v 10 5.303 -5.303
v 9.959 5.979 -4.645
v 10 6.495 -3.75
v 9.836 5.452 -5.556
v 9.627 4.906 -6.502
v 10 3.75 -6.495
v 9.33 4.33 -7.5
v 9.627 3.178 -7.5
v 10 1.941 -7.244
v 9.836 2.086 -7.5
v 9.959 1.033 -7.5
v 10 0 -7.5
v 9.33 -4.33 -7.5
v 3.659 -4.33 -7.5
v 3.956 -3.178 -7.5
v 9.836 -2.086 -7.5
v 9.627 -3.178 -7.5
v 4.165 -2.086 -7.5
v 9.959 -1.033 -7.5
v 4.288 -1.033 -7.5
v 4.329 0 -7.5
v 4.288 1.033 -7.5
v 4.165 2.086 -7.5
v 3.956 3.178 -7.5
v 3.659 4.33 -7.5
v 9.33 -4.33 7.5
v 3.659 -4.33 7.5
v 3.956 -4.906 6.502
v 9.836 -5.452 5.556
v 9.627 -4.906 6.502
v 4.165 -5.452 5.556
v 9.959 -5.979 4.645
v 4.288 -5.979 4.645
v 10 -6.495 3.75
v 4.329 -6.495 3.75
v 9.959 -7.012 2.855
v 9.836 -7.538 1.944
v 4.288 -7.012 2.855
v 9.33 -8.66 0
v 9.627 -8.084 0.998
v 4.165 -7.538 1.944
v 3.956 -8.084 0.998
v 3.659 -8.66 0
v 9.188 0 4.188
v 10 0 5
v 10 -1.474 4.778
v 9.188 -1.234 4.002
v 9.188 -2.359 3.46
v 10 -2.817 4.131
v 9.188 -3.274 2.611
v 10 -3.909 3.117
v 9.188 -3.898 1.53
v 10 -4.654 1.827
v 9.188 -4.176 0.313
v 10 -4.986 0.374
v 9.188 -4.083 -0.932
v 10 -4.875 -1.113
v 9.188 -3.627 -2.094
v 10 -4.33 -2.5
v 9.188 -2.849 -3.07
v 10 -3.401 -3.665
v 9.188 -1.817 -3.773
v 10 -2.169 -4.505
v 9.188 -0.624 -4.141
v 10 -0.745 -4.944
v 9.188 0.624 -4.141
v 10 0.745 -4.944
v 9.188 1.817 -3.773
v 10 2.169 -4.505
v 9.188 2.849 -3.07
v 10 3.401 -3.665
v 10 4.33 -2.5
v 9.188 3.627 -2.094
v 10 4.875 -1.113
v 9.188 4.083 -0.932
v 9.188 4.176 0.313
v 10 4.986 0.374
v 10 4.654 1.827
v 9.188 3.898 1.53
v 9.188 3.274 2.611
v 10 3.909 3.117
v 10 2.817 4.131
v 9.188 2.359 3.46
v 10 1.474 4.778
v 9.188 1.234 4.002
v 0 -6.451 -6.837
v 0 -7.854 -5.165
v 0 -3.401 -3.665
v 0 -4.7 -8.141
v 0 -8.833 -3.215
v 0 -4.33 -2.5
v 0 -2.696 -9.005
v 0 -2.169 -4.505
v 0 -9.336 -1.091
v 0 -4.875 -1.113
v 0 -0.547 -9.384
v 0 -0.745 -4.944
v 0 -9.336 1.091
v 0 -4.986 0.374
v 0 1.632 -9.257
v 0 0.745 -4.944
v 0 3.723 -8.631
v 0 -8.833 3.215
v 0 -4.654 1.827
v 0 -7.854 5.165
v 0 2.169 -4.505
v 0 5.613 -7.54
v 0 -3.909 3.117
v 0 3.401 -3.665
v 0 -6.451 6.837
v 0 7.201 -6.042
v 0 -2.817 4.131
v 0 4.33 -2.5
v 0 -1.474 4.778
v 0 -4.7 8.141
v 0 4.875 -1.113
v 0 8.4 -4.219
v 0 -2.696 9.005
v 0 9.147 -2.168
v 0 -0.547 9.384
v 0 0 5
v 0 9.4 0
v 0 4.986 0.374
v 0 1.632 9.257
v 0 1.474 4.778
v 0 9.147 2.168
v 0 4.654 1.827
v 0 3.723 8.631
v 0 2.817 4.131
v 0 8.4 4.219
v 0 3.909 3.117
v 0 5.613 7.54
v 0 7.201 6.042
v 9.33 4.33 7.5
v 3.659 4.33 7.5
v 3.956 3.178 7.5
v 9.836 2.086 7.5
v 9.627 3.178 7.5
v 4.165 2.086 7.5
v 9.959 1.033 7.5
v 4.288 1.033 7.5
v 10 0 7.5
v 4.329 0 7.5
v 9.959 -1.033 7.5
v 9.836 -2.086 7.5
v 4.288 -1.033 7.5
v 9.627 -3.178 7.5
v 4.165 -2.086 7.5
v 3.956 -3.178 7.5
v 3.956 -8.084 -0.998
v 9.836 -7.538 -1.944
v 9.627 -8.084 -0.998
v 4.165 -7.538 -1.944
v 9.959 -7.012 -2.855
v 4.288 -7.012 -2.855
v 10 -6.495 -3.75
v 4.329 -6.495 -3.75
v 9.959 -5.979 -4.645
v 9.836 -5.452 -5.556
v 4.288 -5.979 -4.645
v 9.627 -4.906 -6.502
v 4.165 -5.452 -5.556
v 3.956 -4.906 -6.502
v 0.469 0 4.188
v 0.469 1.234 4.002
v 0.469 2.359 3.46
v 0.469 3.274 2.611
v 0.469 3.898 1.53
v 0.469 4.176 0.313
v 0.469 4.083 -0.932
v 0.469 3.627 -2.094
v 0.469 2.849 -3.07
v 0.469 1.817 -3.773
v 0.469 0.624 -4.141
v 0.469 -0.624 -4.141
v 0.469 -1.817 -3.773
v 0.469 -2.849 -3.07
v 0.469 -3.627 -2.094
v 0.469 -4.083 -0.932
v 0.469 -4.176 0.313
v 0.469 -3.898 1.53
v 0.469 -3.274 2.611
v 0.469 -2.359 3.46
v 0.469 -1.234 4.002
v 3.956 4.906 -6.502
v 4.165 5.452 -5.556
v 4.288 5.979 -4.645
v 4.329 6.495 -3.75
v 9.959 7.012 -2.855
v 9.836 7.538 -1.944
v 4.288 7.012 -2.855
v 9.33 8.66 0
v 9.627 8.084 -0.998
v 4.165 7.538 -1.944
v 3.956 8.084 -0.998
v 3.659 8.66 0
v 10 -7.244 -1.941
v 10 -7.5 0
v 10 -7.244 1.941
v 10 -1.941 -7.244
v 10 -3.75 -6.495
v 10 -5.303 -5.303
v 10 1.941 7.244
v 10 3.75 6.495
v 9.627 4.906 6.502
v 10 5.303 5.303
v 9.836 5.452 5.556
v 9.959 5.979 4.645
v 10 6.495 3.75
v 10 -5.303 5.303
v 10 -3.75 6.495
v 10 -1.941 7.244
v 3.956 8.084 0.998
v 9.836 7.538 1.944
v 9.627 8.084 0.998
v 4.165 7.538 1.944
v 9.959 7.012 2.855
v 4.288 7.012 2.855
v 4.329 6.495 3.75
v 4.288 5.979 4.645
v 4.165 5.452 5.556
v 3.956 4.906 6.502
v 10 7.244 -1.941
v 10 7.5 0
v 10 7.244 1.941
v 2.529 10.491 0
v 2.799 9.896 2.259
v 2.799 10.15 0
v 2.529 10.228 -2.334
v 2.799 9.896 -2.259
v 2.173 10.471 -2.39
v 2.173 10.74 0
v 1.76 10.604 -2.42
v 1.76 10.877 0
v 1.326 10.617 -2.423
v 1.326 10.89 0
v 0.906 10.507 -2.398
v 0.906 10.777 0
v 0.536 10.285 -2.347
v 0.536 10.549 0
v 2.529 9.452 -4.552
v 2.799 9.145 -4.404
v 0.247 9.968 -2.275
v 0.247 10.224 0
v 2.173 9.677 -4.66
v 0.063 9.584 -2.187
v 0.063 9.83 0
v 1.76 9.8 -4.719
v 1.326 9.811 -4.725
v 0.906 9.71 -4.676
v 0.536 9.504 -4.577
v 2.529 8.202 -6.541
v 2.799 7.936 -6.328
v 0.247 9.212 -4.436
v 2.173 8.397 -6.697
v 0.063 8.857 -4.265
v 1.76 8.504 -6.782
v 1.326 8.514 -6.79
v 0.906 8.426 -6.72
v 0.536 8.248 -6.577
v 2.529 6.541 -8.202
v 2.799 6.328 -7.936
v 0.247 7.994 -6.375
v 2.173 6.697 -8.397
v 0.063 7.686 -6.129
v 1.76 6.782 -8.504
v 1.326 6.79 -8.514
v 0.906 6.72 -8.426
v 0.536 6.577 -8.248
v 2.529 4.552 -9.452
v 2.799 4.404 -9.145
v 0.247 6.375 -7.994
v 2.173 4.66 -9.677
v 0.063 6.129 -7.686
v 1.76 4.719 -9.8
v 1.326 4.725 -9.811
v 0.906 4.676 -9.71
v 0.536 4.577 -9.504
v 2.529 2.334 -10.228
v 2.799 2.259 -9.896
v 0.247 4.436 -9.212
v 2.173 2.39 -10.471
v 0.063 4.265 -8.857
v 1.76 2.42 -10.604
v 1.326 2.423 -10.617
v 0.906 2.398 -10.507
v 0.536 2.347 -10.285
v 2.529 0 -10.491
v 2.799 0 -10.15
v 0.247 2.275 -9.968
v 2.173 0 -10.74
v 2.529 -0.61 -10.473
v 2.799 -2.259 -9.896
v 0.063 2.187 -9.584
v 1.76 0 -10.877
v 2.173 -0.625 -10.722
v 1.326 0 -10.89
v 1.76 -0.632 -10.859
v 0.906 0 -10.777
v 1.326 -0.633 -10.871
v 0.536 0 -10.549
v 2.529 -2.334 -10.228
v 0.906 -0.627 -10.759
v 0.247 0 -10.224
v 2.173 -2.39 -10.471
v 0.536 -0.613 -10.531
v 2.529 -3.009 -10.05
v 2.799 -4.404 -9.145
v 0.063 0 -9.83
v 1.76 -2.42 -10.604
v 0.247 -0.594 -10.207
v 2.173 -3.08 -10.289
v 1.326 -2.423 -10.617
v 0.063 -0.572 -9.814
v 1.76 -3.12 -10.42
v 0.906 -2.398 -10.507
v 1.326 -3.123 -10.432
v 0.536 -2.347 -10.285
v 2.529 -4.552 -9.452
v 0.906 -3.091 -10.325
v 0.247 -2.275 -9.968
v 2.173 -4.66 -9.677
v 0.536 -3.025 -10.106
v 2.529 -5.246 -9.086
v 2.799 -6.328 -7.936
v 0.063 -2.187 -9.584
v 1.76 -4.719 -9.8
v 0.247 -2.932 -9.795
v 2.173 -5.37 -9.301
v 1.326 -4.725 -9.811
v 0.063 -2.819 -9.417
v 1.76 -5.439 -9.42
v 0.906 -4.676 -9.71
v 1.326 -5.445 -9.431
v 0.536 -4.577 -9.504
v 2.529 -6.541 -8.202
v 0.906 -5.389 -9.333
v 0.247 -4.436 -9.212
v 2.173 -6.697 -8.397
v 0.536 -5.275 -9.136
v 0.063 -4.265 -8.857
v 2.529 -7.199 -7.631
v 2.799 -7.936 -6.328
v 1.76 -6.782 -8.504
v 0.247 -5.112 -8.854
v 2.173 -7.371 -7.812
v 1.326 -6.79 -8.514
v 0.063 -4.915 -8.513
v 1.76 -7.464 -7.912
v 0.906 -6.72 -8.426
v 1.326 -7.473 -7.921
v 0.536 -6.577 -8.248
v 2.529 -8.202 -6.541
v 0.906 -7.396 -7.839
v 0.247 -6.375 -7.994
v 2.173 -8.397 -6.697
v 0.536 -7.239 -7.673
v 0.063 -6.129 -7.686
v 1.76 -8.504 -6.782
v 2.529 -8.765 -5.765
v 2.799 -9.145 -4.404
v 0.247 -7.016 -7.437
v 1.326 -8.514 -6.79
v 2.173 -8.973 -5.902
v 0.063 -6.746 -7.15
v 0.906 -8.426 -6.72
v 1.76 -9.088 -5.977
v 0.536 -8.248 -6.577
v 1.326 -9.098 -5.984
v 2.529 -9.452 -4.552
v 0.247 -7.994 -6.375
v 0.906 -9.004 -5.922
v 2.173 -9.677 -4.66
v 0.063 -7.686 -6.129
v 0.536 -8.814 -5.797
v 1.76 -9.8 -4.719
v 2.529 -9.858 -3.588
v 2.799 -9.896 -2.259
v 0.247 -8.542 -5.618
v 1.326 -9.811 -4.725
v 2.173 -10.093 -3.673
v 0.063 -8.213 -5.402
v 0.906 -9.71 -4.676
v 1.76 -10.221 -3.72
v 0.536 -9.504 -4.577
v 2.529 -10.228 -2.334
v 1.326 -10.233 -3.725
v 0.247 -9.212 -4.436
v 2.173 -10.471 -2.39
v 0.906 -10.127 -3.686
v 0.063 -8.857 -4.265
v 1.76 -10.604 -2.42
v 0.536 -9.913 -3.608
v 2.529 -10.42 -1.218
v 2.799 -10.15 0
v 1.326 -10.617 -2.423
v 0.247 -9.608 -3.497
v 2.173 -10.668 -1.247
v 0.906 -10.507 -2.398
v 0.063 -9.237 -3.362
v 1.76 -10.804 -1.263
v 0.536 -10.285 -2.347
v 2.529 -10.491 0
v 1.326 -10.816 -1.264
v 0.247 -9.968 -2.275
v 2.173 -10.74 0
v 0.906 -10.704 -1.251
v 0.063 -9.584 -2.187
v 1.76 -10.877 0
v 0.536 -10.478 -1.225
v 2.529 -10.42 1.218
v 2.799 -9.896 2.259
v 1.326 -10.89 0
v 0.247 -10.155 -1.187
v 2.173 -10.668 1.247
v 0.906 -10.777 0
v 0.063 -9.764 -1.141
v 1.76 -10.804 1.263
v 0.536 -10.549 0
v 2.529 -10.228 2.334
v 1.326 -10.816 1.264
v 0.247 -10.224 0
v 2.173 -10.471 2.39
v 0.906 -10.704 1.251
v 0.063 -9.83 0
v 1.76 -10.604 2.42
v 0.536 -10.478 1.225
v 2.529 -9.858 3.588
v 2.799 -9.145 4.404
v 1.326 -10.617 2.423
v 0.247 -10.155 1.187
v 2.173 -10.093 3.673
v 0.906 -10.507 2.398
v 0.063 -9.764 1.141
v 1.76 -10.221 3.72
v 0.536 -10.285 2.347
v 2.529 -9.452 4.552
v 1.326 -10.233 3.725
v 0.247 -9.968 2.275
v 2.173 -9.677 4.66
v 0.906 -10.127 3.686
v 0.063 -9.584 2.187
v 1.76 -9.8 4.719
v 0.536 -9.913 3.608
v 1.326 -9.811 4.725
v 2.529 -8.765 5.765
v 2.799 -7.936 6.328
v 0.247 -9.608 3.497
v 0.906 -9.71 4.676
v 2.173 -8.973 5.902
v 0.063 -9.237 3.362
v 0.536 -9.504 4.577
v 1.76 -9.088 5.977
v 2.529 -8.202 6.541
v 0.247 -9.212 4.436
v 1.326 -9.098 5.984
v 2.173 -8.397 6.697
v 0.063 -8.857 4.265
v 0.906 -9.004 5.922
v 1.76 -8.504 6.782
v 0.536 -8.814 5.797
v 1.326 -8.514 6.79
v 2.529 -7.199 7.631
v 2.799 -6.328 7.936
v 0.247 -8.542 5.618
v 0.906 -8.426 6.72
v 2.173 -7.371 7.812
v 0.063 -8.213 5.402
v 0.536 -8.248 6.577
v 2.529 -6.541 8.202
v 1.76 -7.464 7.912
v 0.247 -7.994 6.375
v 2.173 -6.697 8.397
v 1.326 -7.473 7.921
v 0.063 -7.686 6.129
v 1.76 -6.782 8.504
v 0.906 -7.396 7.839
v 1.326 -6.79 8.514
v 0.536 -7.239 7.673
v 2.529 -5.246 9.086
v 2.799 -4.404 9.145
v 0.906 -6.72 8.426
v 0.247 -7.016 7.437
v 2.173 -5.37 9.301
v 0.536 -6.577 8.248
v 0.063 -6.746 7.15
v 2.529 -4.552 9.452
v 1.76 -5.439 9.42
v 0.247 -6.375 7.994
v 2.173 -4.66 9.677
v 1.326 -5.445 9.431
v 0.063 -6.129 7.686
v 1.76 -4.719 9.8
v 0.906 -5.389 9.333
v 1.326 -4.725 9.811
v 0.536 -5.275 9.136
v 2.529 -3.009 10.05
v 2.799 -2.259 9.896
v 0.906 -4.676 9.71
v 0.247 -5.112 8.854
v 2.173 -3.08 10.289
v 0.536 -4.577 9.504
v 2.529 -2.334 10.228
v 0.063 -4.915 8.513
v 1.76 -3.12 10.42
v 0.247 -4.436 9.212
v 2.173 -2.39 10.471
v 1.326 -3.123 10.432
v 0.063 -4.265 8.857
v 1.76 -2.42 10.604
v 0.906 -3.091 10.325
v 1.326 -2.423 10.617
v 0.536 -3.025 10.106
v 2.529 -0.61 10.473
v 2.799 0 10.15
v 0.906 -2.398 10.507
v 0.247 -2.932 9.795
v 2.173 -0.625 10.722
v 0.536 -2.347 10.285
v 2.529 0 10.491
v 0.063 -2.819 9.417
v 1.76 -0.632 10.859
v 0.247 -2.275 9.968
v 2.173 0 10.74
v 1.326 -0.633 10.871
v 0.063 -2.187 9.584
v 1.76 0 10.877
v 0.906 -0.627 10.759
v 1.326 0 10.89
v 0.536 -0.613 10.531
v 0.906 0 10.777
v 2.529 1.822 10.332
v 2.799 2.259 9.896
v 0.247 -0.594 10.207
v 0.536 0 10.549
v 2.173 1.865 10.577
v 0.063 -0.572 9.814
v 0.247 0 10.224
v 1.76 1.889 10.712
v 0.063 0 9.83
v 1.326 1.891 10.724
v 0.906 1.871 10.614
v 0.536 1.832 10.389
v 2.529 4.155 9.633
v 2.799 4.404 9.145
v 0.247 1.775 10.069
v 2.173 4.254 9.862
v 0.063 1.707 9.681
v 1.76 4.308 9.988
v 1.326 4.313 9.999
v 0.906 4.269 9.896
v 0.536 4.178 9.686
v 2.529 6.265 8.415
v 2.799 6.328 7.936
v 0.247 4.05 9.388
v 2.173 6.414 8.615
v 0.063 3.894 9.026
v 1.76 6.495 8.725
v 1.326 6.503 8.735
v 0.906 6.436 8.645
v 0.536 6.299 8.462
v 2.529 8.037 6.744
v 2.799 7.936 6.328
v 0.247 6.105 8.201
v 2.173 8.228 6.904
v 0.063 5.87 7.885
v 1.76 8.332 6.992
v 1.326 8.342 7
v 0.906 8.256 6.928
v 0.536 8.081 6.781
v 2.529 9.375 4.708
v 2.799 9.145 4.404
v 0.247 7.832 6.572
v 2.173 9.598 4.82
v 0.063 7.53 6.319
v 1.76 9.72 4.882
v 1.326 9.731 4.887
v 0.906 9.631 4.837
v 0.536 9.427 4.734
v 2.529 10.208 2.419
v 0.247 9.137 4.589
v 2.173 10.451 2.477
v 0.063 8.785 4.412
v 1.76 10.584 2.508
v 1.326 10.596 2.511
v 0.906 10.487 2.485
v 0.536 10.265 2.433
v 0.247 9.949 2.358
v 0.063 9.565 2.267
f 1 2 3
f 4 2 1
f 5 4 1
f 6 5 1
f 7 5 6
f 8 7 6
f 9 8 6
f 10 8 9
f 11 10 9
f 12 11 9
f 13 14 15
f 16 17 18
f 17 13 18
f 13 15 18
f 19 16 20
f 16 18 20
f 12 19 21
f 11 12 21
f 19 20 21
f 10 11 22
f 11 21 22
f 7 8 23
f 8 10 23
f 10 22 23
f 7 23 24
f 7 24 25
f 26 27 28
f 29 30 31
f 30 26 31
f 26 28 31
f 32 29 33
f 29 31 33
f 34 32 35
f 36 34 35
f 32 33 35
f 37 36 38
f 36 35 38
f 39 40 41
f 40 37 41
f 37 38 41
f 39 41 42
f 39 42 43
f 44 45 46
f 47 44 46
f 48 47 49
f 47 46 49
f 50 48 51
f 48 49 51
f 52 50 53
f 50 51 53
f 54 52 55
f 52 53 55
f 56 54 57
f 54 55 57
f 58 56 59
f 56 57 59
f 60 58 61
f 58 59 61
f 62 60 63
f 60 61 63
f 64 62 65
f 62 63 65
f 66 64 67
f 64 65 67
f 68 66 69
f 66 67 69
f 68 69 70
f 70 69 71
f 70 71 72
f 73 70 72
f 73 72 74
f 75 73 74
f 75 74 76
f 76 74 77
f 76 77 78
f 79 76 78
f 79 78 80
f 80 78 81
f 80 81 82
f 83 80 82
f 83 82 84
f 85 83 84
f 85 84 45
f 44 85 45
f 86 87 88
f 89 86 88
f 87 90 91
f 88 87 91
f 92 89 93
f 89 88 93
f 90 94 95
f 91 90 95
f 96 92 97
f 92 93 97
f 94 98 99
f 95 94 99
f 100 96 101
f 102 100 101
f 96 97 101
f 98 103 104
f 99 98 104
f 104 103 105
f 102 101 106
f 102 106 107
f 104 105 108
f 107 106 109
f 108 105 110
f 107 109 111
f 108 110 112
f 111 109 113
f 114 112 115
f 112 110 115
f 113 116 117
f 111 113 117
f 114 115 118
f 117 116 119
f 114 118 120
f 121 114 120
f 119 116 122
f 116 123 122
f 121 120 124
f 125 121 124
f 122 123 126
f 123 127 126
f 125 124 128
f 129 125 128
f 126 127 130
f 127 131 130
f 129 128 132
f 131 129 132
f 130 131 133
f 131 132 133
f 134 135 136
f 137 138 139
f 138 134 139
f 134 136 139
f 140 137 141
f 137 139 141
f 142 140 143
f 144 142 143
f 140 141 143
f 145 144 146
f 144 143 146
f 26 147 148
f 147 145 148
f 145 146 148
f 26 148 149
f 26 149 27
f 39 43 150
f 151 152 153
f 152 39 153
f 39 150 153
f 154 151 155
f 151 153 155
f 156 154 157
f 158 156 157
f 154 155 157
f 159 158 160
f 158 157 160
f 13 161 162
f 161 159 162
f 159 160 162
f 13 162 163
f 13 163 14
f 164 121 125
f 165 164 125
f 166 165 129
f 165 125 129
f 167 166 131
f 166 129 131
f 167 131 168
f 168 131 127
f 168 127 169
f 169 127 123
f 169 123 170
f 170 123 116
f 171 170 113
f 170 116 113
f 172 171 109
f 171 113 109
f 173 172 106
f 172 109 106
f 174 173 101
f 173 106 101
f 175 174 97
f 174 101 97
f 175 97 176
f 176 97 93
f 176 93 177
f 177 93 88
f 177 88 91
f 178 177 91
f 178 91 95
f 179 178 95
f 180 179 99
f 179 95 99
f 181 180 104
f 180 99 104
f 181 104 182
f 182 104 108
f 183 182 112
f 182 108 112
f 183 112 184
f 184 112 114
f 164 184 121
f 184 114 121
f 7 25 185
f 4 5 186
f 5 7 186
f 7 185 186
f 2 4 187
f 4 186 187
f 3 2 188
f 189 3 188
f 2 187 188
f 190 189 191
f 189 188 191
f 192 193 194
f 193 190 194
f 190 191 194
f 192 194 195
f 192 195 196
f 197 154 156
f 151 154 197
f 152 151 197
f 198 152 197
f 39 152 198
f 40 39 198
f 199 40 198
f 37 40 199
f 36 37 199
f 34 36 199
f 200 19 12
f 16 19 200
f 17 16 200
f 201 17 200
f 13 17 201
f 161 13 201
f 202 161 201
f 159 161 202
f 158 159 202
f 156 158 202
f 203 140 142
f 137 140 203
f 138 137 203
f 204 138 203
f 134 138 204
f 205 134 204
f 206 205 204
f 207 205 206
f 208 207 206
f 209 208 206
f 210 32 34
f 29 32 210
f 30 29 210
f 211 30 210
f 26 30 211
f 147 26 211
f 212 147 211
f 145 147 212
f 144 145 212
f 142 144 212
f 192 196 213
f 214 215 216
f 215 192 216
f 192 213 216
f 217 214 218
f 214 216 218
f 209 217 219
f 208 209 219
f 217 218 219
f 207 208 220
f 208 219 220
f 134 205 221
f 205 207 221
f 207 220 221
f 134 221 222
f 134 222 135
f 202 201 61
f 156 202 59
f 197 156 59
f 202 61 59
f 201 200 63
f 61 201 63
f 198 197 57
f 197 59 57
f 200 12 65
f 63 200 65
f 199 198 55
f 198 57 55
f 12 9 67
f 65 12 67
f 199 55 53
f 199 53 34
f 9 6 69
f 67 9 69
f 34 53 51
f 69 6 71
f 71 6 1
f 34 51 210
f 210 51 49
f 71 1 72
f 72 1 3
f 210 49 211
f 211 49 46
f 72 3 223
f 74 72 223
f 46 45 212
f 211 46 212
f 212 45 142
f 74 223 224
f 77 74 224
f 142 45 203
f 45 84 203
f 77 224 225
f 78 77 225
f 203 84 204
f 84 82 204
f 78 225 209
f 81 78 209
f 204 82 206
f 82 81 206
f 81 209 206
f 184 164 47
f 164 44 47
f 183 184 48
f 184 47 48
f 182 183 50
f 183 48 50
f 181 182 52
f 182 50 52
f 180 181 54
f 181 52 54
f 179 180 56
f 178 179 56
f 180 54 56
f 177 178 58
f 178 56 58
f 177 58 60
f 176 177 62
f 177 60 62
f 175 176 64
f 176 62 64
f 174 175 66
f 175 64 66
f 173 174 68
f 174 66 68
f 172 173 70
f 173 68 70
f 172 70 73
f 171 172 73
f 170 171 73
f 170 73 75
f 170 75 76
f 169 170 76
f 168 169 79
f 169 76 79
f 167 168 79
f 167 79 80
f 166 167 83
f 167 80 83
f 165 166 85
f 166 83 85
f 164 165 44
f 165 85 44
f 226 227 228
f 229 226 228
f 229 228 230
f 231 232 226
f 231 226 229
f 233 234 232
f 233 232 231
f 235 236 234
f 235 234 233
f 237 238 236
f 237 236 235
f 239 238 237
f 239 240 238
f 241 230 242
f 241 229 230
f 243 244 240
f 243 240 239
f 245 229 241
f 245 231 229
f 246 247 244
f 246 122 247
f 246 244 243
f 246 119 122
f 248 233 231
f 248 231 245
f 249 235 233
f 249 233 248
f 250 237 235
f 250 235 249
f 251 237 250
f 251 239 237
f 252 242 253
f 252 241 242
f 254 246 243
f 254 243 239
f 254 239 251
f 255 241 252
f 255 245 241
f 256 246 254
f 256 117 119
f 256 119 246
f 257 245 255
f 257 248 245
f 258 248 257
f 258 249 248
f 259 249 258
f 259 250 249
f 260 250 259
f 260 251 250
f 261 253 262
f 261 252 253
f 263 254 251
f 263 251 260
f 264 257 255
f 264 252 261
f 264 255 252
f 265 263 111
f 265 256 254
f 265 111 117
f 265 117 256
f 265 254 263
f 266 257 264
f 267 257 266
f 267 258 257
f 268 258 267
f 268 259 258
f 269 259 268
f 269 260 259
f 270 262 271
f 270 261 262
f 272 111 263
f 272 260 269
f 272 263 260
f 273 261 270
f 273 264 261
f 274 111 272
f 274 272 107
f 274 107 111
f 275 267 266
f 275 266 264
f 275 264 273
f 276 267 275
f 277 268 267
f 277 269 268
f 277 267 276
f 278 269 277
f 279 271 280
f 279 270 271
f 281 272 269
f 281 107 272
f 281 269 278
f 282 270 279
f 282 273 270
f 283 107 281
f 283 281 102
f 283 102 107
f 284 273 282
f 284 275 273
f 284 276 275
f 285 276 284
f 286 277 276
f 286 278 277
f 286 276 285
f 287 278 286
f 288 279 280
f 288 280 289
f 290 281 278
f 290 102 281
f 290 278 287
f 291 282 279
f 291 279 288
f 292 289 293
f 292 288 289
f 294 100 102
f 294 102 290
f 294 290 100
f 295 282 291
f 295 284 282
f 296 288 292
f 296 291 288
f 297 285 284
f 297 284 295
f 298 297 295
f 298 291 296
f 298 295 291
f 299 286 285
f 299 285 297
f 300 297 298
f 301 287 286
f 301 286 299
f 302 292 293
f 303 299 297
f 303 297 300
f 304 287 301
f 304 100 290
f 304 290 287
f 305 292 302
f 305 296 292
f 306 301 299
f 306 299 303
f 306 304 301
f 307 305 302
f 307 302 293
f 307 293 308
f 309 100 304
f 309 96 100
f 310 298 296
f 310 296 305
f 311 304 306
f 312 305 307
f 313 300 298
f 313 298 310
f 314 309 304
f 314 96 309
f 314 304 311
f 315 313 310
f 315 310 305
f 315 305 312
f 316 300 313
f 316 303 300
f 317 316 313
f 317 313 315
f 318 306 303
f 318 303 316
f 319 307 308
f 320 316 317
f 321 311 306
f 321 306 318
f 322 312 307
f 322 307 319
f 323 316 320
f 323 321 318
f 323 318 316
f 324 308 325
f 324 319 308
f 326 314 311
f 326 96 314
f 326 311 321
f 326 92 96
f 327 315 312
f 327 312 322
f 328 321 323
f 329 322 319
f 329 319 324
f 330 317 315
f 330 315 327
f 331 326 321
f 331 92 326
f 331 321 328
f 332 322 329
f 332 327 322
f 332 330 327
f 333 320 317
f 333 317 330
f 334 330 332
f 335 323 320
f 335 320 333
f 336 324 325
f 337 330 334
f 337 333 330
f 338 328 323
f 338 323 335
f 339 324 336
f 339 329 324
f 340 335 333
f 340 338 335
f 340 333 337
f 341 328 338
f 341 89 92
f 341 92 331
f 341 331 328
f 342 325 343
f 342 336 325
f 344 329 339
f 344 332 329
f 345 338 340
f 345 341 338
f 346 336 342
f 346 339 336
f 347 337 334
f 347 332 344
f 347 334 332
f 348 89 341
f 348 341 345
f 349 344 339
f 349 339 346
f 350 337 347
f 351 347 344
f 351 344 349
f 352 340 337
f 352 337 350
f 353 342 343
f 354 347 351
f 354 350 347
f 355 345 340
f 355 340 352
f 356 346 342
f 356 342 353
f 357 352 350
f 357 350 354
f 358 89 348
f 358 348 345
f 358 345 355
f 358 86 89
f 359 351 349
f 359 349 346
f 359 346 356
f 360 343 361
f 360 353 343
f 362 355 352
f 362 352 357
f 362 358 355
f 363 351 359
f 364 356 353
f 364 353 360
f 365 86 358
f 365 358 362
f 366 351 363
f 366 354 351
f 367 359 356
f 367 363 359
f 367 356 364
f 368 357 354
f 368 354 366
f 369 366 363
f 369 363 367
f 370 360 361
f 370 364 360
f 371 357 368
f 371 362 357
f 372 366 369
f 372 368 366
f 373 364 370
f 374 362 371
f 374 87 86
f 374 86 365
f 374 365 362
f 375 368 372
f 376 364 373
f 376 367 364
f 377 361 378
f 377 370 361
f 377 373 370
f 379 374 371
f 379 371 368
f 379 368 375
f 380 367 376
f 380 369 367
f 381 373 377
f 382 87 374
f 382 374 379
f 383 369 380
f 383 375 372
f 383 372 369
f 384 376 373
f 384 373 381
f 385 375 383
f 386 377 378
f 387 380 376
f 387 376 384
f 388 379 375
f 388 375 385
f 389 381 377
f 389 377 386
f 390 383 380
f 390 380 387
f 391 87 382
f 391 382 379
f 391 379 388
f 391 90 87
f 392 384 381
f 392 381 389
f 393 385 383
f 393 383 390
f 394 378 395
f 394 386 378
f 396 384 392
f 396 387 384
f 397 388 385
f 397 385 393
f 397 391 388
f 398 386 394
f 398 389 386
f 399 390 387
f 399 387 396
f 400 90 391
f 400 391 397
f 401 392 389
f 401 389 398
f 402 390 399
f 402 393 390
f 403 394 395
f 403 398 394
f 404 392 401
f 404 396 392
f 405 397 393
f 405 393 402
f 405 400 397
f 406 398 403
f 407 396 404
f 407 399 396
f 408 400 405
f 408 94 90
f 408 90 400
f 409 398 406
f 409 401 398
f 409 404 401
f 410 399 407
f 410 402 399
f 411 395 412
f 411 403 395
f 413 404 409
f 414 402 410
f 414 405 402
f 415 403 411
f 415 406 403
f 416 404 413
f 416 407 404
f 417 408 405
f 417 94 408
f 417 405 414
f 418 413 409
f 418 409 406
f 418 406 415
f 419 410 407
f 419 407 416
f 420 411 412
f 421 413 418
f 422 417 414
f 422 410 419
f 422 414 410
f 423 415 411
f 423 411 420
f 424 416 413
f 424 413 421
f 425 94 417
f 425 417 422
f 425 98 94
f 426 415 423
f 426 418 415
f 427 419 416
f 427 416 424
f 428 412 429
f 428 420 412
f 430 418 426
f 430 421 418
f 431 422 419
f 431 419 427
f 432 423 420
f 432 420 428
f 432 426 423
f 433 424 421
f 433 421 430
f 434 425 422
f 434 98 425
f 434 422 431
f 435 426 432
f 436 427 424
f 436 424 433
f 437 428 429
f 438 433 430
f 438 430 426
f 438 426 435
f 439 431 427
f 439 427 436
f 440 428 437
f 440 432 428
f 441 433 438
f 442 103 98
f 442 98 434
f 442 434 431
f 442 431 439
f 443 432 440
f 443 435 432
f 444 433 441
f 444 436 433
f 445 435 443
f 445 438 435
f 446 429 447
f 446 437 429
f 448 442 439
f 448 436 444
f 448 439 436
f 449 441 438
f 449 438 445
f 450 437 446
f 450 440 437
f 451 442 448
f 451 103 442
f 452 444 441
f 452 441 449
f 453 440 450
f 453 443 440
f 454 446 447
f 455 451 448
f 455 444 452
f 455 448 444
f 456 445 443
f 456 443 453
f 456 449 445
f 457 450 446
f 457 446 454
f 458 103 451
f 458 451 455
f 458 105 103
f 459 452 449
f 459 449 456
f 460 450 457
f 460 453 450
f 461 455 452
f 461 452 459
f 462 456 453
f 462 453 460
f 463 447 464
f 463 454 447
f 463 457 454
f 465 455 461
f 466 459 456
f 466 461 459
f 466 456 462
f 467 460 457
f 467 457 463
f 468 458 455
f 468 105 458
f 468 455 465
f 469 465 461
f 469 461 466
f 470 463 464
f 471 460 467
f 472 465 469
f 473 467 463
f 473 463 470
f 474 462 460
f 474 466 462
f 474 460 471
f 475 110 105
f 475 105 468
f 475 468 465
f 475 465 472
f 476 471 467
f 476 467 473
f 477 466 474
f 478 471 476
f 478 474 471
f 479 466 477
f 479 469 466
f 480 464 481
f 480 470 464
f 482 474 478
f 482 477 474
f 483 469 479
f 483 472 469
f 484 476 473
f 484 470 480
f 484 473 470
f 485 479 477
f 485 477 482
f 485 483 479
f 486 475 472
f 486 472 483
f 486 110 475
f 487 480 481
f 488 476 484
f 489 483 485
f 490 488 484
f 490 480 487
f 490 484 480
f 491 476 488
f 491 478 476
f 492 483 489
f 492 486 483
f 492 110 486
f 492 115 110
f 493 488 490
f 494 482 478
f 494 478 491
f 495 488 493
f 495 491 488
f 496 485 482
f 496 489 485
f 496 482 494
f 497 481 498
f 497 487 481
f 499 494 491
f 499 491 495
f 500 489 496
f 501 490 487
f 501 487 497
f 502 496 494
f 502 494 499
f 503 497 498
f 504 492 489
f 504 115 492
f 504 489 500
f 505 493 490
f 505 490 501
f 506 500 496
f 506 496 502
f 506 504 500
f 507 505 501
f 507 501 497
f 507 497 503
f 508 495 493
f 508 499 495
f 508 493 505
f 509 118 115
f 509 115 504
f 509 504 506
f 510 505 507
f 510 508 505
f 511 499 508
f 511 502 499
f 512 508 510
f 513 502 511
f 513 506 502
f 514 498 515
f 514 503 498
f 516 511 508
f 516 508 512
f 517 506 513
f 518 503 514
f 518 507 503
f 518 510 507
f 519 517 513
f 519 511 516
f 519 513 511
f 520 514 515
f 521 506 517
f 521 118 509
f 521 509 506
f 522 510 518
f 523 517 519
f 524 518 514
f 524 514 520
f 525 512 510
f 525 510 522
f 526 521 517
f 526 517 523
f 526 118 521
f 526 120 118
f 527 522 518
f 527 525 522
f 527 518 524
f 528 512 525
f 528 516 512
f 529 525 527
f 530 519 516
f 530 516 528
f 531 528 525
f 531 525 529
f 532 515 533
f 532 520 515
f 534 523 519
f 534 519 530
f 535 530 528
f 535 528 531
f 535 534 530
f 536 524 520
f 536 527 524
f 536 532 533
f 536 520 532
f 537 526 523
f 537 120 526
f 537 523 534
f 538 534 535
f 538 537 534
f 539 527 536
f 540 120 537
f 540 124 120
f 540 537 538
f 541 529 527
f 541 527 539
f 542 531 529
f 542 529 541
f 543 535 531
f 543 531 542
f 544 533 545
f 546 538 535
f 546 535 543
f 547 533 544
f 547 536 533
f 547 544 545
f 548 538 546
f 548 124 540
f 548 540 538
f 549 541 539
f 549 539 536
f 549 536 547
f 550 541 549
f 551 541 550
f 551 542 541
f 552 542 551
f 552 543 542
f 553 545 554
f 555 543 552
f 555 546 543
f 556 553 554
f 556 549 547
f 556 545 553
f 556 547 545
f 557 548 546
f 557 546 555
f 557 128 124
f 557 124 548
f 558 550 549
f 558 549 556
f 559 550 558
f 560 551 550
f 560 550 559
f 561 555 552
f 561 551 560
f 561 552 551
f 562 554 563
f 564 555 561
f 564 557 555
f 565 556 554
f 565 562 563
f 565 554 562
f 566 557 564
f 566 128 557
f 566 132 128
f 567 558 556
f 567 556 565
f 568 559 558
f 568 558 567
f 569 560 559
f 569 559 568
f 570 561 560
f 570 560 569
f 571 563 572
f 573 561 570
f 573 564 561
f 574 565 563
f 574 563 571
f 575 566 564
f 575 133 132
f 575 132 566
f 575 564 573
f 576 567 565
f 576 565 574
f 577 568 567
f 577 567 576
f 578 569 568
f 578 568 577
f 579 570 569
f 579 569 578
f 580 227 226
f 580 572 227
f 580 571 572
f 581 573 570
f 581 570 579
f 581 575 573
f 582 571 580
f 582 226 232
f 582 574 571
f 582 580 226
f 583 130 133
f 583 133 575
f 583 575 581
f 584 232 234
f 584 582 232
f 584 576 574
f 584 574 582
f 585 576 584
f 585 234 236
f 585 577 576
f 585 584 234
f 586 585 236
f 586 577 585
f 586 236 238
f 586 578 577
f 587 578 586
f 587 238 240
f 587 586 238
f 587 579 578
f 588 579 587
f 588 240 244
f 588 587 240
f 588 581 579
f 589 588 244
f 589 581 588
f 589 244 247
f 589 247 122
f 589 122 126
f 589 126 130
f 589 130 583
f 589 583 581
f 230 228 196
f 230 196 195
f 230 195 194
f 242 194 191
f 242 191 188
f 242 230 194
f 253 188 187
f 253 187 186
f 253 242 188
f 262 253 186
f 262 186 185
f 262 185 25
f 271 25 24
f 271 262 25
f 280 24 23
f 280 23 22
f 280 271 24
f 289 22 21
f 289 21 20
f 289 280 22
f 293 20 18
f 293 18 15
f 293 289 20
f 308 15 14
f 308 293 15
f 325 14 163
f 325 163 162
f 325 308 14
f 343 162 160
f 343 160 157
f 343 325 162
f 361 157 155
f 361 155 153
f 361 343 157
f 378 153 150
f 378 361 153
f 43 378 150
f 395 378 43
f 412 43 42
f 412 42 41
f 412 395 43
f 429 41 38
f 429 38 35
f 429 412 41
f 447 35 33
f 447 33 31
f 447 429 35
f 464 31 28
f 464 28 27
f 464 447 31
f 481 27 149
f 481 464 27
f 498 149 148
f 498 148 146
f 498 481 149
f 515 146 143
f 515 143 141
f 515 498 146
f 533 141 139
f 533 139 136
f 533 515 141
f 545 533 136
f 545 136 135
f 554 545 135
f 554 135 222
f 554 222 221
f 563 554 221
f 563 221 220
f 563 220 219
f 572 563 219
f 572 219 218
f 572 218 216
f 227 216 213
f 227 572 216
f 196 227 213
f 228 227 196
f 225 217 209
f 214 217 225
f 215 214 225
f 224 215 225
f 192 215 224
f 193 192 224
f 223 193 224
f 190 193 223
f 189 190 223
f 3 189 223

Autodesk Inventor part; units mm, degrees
ref_plane "YZ Plane" through (0, 0, 0) normal (1, 0, 0) x (0, 1, 0)
ref_plane "XZ Plane" through (0, 0, 0) normal (0, 1, 0) x (-1, 0, 0)
sketch "Sketch1" plane through (0, 0, 0) normal (0, 0, 1) x (1, 0, 0)
  line L0 (-2.3453, 0) -> (12.0575, 0) projected
  line L1 (4.329, 7.5) -> (2.799, 10.15)
  line L2 (4.329, 7.5) -> (10, 7.5) construction
  line L3 (10, 7.5) -> (10, 0) construction
  arc A0 (2.799, 10.15) -> (0, 9.4) centre (1.5, 9.4) ccw
  line L4 (4.329, 7.5) -> (4.329, 0)
  line L5 (0, -2.2448) -> (0, 13.4687) projected
  point P0 (0, 0)
  dimension "d2" = 15
  dimension "d4" = 21.8
  dimension "d5" = 1.5
  dimension "d15" = 10
  dimension "d16" = 30
revolve "Ring" add sketch "Sketch1" angle 360 about axis through (-10, 0, 0) along (1, 0, 0)
sketch "Sketch2" plane through (0, 0, 0) normal (-1, 0, 0) x (0, 0, 1)
  circle A0 centre (0, 0) radius 4.9
  line L0 (-7.5, -4.3301) -> (-7.5, 4.3301)
  line L1 (-7.5, 4.3301) -> (0, 8.6603)
  line L2 (0, 8.6603) -> (7.5, 4.3301)
  line L3 (7.5, 4.3301) -> (7.5, -4.3301)
  line L4 (7.5, -4.3301) -> (0, -8.6603)
  line L5 (0, -8.6603) -> (-7.5, -4.3301)
  circle A1 centre (0, 0) radius 9.4 projected
  dimension "d6" = 17.3205
extrude "Body" add sketch "Sketch2" against normal blind 10 contours A0 | L0 L1 L2 L3 L4 L5
sketch "Sketch3" plane through (0, 0, 0) normal (0, 0, 1) x (1, 0, 0)
  line L0 (3.6591, 8.6603) -> (10, 8.6603) projected
  line L1 (10, 4.3301) -> (10, 8.6603) projected
  line L2 (0, -9.4) -> (0, 9.4) projected
  line L3 (-2, 0) -> (12, 0) projected
  line L4 (9.3301, 8.6603) -> (10, 7.5)
  dimension "d10" = 30
  dimension "d11" = 15
revolve "Chamfer1" cut sketch "Sketch3" angle 360 about axis through (-10, 0, 0) along (1, 0, 0)
sketch "Sketch4" plane through (0, 0, 0) normal (-1, 0, 0) x (0, 0, 1)
  circle A0 centre (0, 0) radius 9.4 projected
hole "Thread" at (0, 0, 0) direction (1, 0, 0) diameter 8.376 end through all thread size "M10x1.5" class "6H" standard "ANSI Metric M Profile"
chamfer "Chamfer2" distance 0.8119 angle 30 1 edges at (0, 0, -4.188) measured on face at (0, 7.5614, -0.9181)
ref_plane "Work Plane1" through (32.4111, 0, 0) normal (0, 0, -1) x (-1, 0, 0)
chamfer "Chamfer3" distance 0.8119 angle 45 1 edges at (10, 0, -4.188)
equation "\"d2\" = SW"
equation "\"d4\" = LADI"
equation "\"d5\" = PHH"
equation "\"d15\" = KOH"
equation "\"d16\" = KEWI"
equation "\"d6\" = 1.1547 * SW"
equation "\"d7\" = KOH"
equation "\"d10\" = ANG1"
equation "\"d11\" = SW0"
equation "\"d12\" = -0.5 * GD1 + 0.5 * NND"
equation "\"d46\" = -0.5 * GD1 + 0.5 * NND"
equation "\"d51\" = -0.5 * GD1 + 0.5 * NND"
equation "\"ANG1\" = 30deg"
equation "\"KEWI\" = 30deg"
equation "\"LADI\" = 21.8"
equation "\"SW\" = 15"
equation "\"PHH\" = RR"
equation "\"KOH\" = 10"
equation "\"SW0\" = SW"
equation "\"d1\" = LADI"
equation "\"d3\" = PHH"
equation "\"GUL\" = 0.541266 * PTC"
equation "\"RR\" = 1.5"
equation "\"TOA\" = 30deg"
equation "\"PTC\" = 1.5"
equation "\"RR1\" = 0.6"
equation "\"GAL\" = 0.541266 * PTC"
equation "\"E0\" = 1.155 * SW"
equation "\"GD1\" = 8.376202"
equation "\"NND\" = 10"
properties part number "ANSI B18.2.4.4M - M10 x 1,5" material "Steel, Mild"
